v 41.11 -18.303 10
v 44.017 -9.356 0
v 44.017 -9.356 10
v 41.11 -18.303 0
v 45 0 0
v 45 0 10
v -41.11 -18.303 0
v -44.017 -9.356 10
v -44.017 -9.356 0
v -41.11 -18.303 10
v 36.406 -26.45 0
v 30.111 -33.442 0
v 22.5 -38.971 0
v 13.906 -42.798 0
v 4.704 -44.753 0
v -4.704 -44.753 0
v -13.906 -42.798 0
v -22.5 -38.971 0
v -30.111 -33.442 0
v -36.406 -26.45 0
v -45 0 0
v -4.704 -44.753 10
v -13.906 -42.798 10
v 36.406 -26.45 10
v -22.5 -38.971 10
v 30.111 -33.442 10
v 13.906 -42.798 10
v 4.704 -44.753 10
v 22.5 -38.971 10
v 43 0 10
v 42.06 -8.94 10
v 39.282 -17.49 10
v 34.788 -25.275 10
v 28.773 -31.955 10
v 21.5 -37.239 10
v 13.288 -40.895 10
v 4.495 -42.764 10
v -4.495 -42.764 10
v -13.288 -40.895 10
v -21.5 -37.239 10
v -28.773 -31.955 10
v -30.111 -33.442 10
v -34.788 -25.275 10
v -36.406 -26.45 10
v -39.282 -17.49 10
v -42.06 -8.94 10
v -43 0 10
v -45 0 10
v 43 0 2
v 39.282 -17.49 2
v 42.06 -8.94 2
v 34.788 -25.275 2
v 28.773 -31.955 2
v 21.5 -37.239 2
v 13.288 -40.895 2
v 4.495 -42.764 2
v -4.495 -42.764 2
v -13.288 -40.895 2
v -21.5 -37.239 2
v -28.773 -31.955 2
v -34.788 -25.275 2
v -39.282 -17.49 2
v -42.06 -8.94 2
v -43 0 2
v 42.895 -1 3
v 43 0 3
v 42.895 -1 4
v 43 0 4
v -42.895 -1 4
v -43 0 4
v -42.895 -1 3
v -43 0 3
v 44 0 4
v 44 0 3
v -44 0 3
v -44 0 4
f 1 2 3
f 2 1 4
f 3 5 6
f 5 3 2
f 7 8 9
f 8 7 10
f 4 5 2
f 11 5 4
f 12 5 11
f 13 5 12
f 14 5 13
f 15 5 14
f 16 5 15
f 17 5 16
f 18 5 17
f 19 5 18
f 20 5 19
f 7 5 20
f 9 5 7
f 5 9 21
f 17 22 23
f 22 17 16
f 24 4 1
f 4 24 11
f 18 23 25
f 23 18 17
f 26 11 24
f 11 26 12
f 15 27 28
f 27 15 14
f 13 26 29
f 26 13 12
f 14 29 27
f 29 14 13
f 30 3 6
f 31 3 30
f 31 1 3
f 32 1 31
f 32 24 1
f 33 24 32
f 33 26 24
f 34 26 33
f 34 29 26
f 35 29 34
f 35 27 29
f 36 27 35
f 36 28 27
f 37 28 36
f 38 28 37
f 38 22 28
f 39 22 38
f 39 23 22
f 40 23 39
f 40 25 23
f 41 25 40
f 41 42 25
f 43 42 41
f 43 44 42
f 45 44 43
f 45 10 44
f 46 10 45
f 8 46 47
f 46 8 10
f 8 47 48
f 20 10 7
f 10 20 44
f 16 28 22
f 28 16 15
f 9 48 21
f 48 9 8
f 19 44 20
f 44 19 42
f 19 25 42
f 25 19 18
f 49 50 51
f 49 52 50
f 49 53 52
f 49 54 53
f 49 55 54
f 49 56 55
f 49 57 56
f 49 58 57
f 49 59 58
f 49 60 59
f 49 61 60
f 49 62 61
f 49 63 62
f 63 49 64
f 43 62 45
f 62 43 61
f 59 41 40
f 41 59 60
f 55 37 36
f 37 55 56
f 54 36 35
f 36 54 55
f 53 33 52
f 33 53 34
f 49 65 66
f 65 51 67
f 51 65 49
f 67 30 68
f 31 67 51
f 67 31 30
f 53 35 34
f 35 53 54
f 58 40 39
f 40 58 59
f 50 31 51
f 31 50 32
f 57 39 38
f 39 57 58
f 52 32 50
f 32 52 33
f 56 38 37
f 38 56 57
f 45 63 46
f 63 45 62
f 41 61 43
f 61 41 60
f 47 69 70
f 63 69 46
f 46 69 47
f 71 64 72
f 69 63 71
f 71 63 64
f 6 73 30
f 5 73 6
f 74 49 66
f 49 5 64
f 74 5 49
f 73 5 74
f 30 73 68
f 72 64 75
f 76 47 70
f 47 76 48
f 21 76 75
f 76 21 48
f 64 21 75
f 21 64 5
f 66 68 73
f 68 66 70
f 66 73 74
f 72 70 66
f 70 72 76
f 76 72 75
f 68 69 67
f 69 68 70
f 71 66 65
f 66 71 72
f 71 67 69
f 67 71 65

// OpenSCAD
$fn=30;
difference(){
	difference(){
		cylinder(h=10, r=45);
		translate([0,0,2])
			cylinder(h=15,r=43);
	}

	translate([-45,0,-1])
		cube(112);
}

for (i=[-42:45])
{
translate([1-i,-1,3])
cube([1,1,1]);
}

difference(){
	difference(){
		cylinder(h=10, r=45);
		translate([0,0,2])
			cylinder(h=15,r=43);
	}

	translate([-45,0,-1])
		cube(112);
}
